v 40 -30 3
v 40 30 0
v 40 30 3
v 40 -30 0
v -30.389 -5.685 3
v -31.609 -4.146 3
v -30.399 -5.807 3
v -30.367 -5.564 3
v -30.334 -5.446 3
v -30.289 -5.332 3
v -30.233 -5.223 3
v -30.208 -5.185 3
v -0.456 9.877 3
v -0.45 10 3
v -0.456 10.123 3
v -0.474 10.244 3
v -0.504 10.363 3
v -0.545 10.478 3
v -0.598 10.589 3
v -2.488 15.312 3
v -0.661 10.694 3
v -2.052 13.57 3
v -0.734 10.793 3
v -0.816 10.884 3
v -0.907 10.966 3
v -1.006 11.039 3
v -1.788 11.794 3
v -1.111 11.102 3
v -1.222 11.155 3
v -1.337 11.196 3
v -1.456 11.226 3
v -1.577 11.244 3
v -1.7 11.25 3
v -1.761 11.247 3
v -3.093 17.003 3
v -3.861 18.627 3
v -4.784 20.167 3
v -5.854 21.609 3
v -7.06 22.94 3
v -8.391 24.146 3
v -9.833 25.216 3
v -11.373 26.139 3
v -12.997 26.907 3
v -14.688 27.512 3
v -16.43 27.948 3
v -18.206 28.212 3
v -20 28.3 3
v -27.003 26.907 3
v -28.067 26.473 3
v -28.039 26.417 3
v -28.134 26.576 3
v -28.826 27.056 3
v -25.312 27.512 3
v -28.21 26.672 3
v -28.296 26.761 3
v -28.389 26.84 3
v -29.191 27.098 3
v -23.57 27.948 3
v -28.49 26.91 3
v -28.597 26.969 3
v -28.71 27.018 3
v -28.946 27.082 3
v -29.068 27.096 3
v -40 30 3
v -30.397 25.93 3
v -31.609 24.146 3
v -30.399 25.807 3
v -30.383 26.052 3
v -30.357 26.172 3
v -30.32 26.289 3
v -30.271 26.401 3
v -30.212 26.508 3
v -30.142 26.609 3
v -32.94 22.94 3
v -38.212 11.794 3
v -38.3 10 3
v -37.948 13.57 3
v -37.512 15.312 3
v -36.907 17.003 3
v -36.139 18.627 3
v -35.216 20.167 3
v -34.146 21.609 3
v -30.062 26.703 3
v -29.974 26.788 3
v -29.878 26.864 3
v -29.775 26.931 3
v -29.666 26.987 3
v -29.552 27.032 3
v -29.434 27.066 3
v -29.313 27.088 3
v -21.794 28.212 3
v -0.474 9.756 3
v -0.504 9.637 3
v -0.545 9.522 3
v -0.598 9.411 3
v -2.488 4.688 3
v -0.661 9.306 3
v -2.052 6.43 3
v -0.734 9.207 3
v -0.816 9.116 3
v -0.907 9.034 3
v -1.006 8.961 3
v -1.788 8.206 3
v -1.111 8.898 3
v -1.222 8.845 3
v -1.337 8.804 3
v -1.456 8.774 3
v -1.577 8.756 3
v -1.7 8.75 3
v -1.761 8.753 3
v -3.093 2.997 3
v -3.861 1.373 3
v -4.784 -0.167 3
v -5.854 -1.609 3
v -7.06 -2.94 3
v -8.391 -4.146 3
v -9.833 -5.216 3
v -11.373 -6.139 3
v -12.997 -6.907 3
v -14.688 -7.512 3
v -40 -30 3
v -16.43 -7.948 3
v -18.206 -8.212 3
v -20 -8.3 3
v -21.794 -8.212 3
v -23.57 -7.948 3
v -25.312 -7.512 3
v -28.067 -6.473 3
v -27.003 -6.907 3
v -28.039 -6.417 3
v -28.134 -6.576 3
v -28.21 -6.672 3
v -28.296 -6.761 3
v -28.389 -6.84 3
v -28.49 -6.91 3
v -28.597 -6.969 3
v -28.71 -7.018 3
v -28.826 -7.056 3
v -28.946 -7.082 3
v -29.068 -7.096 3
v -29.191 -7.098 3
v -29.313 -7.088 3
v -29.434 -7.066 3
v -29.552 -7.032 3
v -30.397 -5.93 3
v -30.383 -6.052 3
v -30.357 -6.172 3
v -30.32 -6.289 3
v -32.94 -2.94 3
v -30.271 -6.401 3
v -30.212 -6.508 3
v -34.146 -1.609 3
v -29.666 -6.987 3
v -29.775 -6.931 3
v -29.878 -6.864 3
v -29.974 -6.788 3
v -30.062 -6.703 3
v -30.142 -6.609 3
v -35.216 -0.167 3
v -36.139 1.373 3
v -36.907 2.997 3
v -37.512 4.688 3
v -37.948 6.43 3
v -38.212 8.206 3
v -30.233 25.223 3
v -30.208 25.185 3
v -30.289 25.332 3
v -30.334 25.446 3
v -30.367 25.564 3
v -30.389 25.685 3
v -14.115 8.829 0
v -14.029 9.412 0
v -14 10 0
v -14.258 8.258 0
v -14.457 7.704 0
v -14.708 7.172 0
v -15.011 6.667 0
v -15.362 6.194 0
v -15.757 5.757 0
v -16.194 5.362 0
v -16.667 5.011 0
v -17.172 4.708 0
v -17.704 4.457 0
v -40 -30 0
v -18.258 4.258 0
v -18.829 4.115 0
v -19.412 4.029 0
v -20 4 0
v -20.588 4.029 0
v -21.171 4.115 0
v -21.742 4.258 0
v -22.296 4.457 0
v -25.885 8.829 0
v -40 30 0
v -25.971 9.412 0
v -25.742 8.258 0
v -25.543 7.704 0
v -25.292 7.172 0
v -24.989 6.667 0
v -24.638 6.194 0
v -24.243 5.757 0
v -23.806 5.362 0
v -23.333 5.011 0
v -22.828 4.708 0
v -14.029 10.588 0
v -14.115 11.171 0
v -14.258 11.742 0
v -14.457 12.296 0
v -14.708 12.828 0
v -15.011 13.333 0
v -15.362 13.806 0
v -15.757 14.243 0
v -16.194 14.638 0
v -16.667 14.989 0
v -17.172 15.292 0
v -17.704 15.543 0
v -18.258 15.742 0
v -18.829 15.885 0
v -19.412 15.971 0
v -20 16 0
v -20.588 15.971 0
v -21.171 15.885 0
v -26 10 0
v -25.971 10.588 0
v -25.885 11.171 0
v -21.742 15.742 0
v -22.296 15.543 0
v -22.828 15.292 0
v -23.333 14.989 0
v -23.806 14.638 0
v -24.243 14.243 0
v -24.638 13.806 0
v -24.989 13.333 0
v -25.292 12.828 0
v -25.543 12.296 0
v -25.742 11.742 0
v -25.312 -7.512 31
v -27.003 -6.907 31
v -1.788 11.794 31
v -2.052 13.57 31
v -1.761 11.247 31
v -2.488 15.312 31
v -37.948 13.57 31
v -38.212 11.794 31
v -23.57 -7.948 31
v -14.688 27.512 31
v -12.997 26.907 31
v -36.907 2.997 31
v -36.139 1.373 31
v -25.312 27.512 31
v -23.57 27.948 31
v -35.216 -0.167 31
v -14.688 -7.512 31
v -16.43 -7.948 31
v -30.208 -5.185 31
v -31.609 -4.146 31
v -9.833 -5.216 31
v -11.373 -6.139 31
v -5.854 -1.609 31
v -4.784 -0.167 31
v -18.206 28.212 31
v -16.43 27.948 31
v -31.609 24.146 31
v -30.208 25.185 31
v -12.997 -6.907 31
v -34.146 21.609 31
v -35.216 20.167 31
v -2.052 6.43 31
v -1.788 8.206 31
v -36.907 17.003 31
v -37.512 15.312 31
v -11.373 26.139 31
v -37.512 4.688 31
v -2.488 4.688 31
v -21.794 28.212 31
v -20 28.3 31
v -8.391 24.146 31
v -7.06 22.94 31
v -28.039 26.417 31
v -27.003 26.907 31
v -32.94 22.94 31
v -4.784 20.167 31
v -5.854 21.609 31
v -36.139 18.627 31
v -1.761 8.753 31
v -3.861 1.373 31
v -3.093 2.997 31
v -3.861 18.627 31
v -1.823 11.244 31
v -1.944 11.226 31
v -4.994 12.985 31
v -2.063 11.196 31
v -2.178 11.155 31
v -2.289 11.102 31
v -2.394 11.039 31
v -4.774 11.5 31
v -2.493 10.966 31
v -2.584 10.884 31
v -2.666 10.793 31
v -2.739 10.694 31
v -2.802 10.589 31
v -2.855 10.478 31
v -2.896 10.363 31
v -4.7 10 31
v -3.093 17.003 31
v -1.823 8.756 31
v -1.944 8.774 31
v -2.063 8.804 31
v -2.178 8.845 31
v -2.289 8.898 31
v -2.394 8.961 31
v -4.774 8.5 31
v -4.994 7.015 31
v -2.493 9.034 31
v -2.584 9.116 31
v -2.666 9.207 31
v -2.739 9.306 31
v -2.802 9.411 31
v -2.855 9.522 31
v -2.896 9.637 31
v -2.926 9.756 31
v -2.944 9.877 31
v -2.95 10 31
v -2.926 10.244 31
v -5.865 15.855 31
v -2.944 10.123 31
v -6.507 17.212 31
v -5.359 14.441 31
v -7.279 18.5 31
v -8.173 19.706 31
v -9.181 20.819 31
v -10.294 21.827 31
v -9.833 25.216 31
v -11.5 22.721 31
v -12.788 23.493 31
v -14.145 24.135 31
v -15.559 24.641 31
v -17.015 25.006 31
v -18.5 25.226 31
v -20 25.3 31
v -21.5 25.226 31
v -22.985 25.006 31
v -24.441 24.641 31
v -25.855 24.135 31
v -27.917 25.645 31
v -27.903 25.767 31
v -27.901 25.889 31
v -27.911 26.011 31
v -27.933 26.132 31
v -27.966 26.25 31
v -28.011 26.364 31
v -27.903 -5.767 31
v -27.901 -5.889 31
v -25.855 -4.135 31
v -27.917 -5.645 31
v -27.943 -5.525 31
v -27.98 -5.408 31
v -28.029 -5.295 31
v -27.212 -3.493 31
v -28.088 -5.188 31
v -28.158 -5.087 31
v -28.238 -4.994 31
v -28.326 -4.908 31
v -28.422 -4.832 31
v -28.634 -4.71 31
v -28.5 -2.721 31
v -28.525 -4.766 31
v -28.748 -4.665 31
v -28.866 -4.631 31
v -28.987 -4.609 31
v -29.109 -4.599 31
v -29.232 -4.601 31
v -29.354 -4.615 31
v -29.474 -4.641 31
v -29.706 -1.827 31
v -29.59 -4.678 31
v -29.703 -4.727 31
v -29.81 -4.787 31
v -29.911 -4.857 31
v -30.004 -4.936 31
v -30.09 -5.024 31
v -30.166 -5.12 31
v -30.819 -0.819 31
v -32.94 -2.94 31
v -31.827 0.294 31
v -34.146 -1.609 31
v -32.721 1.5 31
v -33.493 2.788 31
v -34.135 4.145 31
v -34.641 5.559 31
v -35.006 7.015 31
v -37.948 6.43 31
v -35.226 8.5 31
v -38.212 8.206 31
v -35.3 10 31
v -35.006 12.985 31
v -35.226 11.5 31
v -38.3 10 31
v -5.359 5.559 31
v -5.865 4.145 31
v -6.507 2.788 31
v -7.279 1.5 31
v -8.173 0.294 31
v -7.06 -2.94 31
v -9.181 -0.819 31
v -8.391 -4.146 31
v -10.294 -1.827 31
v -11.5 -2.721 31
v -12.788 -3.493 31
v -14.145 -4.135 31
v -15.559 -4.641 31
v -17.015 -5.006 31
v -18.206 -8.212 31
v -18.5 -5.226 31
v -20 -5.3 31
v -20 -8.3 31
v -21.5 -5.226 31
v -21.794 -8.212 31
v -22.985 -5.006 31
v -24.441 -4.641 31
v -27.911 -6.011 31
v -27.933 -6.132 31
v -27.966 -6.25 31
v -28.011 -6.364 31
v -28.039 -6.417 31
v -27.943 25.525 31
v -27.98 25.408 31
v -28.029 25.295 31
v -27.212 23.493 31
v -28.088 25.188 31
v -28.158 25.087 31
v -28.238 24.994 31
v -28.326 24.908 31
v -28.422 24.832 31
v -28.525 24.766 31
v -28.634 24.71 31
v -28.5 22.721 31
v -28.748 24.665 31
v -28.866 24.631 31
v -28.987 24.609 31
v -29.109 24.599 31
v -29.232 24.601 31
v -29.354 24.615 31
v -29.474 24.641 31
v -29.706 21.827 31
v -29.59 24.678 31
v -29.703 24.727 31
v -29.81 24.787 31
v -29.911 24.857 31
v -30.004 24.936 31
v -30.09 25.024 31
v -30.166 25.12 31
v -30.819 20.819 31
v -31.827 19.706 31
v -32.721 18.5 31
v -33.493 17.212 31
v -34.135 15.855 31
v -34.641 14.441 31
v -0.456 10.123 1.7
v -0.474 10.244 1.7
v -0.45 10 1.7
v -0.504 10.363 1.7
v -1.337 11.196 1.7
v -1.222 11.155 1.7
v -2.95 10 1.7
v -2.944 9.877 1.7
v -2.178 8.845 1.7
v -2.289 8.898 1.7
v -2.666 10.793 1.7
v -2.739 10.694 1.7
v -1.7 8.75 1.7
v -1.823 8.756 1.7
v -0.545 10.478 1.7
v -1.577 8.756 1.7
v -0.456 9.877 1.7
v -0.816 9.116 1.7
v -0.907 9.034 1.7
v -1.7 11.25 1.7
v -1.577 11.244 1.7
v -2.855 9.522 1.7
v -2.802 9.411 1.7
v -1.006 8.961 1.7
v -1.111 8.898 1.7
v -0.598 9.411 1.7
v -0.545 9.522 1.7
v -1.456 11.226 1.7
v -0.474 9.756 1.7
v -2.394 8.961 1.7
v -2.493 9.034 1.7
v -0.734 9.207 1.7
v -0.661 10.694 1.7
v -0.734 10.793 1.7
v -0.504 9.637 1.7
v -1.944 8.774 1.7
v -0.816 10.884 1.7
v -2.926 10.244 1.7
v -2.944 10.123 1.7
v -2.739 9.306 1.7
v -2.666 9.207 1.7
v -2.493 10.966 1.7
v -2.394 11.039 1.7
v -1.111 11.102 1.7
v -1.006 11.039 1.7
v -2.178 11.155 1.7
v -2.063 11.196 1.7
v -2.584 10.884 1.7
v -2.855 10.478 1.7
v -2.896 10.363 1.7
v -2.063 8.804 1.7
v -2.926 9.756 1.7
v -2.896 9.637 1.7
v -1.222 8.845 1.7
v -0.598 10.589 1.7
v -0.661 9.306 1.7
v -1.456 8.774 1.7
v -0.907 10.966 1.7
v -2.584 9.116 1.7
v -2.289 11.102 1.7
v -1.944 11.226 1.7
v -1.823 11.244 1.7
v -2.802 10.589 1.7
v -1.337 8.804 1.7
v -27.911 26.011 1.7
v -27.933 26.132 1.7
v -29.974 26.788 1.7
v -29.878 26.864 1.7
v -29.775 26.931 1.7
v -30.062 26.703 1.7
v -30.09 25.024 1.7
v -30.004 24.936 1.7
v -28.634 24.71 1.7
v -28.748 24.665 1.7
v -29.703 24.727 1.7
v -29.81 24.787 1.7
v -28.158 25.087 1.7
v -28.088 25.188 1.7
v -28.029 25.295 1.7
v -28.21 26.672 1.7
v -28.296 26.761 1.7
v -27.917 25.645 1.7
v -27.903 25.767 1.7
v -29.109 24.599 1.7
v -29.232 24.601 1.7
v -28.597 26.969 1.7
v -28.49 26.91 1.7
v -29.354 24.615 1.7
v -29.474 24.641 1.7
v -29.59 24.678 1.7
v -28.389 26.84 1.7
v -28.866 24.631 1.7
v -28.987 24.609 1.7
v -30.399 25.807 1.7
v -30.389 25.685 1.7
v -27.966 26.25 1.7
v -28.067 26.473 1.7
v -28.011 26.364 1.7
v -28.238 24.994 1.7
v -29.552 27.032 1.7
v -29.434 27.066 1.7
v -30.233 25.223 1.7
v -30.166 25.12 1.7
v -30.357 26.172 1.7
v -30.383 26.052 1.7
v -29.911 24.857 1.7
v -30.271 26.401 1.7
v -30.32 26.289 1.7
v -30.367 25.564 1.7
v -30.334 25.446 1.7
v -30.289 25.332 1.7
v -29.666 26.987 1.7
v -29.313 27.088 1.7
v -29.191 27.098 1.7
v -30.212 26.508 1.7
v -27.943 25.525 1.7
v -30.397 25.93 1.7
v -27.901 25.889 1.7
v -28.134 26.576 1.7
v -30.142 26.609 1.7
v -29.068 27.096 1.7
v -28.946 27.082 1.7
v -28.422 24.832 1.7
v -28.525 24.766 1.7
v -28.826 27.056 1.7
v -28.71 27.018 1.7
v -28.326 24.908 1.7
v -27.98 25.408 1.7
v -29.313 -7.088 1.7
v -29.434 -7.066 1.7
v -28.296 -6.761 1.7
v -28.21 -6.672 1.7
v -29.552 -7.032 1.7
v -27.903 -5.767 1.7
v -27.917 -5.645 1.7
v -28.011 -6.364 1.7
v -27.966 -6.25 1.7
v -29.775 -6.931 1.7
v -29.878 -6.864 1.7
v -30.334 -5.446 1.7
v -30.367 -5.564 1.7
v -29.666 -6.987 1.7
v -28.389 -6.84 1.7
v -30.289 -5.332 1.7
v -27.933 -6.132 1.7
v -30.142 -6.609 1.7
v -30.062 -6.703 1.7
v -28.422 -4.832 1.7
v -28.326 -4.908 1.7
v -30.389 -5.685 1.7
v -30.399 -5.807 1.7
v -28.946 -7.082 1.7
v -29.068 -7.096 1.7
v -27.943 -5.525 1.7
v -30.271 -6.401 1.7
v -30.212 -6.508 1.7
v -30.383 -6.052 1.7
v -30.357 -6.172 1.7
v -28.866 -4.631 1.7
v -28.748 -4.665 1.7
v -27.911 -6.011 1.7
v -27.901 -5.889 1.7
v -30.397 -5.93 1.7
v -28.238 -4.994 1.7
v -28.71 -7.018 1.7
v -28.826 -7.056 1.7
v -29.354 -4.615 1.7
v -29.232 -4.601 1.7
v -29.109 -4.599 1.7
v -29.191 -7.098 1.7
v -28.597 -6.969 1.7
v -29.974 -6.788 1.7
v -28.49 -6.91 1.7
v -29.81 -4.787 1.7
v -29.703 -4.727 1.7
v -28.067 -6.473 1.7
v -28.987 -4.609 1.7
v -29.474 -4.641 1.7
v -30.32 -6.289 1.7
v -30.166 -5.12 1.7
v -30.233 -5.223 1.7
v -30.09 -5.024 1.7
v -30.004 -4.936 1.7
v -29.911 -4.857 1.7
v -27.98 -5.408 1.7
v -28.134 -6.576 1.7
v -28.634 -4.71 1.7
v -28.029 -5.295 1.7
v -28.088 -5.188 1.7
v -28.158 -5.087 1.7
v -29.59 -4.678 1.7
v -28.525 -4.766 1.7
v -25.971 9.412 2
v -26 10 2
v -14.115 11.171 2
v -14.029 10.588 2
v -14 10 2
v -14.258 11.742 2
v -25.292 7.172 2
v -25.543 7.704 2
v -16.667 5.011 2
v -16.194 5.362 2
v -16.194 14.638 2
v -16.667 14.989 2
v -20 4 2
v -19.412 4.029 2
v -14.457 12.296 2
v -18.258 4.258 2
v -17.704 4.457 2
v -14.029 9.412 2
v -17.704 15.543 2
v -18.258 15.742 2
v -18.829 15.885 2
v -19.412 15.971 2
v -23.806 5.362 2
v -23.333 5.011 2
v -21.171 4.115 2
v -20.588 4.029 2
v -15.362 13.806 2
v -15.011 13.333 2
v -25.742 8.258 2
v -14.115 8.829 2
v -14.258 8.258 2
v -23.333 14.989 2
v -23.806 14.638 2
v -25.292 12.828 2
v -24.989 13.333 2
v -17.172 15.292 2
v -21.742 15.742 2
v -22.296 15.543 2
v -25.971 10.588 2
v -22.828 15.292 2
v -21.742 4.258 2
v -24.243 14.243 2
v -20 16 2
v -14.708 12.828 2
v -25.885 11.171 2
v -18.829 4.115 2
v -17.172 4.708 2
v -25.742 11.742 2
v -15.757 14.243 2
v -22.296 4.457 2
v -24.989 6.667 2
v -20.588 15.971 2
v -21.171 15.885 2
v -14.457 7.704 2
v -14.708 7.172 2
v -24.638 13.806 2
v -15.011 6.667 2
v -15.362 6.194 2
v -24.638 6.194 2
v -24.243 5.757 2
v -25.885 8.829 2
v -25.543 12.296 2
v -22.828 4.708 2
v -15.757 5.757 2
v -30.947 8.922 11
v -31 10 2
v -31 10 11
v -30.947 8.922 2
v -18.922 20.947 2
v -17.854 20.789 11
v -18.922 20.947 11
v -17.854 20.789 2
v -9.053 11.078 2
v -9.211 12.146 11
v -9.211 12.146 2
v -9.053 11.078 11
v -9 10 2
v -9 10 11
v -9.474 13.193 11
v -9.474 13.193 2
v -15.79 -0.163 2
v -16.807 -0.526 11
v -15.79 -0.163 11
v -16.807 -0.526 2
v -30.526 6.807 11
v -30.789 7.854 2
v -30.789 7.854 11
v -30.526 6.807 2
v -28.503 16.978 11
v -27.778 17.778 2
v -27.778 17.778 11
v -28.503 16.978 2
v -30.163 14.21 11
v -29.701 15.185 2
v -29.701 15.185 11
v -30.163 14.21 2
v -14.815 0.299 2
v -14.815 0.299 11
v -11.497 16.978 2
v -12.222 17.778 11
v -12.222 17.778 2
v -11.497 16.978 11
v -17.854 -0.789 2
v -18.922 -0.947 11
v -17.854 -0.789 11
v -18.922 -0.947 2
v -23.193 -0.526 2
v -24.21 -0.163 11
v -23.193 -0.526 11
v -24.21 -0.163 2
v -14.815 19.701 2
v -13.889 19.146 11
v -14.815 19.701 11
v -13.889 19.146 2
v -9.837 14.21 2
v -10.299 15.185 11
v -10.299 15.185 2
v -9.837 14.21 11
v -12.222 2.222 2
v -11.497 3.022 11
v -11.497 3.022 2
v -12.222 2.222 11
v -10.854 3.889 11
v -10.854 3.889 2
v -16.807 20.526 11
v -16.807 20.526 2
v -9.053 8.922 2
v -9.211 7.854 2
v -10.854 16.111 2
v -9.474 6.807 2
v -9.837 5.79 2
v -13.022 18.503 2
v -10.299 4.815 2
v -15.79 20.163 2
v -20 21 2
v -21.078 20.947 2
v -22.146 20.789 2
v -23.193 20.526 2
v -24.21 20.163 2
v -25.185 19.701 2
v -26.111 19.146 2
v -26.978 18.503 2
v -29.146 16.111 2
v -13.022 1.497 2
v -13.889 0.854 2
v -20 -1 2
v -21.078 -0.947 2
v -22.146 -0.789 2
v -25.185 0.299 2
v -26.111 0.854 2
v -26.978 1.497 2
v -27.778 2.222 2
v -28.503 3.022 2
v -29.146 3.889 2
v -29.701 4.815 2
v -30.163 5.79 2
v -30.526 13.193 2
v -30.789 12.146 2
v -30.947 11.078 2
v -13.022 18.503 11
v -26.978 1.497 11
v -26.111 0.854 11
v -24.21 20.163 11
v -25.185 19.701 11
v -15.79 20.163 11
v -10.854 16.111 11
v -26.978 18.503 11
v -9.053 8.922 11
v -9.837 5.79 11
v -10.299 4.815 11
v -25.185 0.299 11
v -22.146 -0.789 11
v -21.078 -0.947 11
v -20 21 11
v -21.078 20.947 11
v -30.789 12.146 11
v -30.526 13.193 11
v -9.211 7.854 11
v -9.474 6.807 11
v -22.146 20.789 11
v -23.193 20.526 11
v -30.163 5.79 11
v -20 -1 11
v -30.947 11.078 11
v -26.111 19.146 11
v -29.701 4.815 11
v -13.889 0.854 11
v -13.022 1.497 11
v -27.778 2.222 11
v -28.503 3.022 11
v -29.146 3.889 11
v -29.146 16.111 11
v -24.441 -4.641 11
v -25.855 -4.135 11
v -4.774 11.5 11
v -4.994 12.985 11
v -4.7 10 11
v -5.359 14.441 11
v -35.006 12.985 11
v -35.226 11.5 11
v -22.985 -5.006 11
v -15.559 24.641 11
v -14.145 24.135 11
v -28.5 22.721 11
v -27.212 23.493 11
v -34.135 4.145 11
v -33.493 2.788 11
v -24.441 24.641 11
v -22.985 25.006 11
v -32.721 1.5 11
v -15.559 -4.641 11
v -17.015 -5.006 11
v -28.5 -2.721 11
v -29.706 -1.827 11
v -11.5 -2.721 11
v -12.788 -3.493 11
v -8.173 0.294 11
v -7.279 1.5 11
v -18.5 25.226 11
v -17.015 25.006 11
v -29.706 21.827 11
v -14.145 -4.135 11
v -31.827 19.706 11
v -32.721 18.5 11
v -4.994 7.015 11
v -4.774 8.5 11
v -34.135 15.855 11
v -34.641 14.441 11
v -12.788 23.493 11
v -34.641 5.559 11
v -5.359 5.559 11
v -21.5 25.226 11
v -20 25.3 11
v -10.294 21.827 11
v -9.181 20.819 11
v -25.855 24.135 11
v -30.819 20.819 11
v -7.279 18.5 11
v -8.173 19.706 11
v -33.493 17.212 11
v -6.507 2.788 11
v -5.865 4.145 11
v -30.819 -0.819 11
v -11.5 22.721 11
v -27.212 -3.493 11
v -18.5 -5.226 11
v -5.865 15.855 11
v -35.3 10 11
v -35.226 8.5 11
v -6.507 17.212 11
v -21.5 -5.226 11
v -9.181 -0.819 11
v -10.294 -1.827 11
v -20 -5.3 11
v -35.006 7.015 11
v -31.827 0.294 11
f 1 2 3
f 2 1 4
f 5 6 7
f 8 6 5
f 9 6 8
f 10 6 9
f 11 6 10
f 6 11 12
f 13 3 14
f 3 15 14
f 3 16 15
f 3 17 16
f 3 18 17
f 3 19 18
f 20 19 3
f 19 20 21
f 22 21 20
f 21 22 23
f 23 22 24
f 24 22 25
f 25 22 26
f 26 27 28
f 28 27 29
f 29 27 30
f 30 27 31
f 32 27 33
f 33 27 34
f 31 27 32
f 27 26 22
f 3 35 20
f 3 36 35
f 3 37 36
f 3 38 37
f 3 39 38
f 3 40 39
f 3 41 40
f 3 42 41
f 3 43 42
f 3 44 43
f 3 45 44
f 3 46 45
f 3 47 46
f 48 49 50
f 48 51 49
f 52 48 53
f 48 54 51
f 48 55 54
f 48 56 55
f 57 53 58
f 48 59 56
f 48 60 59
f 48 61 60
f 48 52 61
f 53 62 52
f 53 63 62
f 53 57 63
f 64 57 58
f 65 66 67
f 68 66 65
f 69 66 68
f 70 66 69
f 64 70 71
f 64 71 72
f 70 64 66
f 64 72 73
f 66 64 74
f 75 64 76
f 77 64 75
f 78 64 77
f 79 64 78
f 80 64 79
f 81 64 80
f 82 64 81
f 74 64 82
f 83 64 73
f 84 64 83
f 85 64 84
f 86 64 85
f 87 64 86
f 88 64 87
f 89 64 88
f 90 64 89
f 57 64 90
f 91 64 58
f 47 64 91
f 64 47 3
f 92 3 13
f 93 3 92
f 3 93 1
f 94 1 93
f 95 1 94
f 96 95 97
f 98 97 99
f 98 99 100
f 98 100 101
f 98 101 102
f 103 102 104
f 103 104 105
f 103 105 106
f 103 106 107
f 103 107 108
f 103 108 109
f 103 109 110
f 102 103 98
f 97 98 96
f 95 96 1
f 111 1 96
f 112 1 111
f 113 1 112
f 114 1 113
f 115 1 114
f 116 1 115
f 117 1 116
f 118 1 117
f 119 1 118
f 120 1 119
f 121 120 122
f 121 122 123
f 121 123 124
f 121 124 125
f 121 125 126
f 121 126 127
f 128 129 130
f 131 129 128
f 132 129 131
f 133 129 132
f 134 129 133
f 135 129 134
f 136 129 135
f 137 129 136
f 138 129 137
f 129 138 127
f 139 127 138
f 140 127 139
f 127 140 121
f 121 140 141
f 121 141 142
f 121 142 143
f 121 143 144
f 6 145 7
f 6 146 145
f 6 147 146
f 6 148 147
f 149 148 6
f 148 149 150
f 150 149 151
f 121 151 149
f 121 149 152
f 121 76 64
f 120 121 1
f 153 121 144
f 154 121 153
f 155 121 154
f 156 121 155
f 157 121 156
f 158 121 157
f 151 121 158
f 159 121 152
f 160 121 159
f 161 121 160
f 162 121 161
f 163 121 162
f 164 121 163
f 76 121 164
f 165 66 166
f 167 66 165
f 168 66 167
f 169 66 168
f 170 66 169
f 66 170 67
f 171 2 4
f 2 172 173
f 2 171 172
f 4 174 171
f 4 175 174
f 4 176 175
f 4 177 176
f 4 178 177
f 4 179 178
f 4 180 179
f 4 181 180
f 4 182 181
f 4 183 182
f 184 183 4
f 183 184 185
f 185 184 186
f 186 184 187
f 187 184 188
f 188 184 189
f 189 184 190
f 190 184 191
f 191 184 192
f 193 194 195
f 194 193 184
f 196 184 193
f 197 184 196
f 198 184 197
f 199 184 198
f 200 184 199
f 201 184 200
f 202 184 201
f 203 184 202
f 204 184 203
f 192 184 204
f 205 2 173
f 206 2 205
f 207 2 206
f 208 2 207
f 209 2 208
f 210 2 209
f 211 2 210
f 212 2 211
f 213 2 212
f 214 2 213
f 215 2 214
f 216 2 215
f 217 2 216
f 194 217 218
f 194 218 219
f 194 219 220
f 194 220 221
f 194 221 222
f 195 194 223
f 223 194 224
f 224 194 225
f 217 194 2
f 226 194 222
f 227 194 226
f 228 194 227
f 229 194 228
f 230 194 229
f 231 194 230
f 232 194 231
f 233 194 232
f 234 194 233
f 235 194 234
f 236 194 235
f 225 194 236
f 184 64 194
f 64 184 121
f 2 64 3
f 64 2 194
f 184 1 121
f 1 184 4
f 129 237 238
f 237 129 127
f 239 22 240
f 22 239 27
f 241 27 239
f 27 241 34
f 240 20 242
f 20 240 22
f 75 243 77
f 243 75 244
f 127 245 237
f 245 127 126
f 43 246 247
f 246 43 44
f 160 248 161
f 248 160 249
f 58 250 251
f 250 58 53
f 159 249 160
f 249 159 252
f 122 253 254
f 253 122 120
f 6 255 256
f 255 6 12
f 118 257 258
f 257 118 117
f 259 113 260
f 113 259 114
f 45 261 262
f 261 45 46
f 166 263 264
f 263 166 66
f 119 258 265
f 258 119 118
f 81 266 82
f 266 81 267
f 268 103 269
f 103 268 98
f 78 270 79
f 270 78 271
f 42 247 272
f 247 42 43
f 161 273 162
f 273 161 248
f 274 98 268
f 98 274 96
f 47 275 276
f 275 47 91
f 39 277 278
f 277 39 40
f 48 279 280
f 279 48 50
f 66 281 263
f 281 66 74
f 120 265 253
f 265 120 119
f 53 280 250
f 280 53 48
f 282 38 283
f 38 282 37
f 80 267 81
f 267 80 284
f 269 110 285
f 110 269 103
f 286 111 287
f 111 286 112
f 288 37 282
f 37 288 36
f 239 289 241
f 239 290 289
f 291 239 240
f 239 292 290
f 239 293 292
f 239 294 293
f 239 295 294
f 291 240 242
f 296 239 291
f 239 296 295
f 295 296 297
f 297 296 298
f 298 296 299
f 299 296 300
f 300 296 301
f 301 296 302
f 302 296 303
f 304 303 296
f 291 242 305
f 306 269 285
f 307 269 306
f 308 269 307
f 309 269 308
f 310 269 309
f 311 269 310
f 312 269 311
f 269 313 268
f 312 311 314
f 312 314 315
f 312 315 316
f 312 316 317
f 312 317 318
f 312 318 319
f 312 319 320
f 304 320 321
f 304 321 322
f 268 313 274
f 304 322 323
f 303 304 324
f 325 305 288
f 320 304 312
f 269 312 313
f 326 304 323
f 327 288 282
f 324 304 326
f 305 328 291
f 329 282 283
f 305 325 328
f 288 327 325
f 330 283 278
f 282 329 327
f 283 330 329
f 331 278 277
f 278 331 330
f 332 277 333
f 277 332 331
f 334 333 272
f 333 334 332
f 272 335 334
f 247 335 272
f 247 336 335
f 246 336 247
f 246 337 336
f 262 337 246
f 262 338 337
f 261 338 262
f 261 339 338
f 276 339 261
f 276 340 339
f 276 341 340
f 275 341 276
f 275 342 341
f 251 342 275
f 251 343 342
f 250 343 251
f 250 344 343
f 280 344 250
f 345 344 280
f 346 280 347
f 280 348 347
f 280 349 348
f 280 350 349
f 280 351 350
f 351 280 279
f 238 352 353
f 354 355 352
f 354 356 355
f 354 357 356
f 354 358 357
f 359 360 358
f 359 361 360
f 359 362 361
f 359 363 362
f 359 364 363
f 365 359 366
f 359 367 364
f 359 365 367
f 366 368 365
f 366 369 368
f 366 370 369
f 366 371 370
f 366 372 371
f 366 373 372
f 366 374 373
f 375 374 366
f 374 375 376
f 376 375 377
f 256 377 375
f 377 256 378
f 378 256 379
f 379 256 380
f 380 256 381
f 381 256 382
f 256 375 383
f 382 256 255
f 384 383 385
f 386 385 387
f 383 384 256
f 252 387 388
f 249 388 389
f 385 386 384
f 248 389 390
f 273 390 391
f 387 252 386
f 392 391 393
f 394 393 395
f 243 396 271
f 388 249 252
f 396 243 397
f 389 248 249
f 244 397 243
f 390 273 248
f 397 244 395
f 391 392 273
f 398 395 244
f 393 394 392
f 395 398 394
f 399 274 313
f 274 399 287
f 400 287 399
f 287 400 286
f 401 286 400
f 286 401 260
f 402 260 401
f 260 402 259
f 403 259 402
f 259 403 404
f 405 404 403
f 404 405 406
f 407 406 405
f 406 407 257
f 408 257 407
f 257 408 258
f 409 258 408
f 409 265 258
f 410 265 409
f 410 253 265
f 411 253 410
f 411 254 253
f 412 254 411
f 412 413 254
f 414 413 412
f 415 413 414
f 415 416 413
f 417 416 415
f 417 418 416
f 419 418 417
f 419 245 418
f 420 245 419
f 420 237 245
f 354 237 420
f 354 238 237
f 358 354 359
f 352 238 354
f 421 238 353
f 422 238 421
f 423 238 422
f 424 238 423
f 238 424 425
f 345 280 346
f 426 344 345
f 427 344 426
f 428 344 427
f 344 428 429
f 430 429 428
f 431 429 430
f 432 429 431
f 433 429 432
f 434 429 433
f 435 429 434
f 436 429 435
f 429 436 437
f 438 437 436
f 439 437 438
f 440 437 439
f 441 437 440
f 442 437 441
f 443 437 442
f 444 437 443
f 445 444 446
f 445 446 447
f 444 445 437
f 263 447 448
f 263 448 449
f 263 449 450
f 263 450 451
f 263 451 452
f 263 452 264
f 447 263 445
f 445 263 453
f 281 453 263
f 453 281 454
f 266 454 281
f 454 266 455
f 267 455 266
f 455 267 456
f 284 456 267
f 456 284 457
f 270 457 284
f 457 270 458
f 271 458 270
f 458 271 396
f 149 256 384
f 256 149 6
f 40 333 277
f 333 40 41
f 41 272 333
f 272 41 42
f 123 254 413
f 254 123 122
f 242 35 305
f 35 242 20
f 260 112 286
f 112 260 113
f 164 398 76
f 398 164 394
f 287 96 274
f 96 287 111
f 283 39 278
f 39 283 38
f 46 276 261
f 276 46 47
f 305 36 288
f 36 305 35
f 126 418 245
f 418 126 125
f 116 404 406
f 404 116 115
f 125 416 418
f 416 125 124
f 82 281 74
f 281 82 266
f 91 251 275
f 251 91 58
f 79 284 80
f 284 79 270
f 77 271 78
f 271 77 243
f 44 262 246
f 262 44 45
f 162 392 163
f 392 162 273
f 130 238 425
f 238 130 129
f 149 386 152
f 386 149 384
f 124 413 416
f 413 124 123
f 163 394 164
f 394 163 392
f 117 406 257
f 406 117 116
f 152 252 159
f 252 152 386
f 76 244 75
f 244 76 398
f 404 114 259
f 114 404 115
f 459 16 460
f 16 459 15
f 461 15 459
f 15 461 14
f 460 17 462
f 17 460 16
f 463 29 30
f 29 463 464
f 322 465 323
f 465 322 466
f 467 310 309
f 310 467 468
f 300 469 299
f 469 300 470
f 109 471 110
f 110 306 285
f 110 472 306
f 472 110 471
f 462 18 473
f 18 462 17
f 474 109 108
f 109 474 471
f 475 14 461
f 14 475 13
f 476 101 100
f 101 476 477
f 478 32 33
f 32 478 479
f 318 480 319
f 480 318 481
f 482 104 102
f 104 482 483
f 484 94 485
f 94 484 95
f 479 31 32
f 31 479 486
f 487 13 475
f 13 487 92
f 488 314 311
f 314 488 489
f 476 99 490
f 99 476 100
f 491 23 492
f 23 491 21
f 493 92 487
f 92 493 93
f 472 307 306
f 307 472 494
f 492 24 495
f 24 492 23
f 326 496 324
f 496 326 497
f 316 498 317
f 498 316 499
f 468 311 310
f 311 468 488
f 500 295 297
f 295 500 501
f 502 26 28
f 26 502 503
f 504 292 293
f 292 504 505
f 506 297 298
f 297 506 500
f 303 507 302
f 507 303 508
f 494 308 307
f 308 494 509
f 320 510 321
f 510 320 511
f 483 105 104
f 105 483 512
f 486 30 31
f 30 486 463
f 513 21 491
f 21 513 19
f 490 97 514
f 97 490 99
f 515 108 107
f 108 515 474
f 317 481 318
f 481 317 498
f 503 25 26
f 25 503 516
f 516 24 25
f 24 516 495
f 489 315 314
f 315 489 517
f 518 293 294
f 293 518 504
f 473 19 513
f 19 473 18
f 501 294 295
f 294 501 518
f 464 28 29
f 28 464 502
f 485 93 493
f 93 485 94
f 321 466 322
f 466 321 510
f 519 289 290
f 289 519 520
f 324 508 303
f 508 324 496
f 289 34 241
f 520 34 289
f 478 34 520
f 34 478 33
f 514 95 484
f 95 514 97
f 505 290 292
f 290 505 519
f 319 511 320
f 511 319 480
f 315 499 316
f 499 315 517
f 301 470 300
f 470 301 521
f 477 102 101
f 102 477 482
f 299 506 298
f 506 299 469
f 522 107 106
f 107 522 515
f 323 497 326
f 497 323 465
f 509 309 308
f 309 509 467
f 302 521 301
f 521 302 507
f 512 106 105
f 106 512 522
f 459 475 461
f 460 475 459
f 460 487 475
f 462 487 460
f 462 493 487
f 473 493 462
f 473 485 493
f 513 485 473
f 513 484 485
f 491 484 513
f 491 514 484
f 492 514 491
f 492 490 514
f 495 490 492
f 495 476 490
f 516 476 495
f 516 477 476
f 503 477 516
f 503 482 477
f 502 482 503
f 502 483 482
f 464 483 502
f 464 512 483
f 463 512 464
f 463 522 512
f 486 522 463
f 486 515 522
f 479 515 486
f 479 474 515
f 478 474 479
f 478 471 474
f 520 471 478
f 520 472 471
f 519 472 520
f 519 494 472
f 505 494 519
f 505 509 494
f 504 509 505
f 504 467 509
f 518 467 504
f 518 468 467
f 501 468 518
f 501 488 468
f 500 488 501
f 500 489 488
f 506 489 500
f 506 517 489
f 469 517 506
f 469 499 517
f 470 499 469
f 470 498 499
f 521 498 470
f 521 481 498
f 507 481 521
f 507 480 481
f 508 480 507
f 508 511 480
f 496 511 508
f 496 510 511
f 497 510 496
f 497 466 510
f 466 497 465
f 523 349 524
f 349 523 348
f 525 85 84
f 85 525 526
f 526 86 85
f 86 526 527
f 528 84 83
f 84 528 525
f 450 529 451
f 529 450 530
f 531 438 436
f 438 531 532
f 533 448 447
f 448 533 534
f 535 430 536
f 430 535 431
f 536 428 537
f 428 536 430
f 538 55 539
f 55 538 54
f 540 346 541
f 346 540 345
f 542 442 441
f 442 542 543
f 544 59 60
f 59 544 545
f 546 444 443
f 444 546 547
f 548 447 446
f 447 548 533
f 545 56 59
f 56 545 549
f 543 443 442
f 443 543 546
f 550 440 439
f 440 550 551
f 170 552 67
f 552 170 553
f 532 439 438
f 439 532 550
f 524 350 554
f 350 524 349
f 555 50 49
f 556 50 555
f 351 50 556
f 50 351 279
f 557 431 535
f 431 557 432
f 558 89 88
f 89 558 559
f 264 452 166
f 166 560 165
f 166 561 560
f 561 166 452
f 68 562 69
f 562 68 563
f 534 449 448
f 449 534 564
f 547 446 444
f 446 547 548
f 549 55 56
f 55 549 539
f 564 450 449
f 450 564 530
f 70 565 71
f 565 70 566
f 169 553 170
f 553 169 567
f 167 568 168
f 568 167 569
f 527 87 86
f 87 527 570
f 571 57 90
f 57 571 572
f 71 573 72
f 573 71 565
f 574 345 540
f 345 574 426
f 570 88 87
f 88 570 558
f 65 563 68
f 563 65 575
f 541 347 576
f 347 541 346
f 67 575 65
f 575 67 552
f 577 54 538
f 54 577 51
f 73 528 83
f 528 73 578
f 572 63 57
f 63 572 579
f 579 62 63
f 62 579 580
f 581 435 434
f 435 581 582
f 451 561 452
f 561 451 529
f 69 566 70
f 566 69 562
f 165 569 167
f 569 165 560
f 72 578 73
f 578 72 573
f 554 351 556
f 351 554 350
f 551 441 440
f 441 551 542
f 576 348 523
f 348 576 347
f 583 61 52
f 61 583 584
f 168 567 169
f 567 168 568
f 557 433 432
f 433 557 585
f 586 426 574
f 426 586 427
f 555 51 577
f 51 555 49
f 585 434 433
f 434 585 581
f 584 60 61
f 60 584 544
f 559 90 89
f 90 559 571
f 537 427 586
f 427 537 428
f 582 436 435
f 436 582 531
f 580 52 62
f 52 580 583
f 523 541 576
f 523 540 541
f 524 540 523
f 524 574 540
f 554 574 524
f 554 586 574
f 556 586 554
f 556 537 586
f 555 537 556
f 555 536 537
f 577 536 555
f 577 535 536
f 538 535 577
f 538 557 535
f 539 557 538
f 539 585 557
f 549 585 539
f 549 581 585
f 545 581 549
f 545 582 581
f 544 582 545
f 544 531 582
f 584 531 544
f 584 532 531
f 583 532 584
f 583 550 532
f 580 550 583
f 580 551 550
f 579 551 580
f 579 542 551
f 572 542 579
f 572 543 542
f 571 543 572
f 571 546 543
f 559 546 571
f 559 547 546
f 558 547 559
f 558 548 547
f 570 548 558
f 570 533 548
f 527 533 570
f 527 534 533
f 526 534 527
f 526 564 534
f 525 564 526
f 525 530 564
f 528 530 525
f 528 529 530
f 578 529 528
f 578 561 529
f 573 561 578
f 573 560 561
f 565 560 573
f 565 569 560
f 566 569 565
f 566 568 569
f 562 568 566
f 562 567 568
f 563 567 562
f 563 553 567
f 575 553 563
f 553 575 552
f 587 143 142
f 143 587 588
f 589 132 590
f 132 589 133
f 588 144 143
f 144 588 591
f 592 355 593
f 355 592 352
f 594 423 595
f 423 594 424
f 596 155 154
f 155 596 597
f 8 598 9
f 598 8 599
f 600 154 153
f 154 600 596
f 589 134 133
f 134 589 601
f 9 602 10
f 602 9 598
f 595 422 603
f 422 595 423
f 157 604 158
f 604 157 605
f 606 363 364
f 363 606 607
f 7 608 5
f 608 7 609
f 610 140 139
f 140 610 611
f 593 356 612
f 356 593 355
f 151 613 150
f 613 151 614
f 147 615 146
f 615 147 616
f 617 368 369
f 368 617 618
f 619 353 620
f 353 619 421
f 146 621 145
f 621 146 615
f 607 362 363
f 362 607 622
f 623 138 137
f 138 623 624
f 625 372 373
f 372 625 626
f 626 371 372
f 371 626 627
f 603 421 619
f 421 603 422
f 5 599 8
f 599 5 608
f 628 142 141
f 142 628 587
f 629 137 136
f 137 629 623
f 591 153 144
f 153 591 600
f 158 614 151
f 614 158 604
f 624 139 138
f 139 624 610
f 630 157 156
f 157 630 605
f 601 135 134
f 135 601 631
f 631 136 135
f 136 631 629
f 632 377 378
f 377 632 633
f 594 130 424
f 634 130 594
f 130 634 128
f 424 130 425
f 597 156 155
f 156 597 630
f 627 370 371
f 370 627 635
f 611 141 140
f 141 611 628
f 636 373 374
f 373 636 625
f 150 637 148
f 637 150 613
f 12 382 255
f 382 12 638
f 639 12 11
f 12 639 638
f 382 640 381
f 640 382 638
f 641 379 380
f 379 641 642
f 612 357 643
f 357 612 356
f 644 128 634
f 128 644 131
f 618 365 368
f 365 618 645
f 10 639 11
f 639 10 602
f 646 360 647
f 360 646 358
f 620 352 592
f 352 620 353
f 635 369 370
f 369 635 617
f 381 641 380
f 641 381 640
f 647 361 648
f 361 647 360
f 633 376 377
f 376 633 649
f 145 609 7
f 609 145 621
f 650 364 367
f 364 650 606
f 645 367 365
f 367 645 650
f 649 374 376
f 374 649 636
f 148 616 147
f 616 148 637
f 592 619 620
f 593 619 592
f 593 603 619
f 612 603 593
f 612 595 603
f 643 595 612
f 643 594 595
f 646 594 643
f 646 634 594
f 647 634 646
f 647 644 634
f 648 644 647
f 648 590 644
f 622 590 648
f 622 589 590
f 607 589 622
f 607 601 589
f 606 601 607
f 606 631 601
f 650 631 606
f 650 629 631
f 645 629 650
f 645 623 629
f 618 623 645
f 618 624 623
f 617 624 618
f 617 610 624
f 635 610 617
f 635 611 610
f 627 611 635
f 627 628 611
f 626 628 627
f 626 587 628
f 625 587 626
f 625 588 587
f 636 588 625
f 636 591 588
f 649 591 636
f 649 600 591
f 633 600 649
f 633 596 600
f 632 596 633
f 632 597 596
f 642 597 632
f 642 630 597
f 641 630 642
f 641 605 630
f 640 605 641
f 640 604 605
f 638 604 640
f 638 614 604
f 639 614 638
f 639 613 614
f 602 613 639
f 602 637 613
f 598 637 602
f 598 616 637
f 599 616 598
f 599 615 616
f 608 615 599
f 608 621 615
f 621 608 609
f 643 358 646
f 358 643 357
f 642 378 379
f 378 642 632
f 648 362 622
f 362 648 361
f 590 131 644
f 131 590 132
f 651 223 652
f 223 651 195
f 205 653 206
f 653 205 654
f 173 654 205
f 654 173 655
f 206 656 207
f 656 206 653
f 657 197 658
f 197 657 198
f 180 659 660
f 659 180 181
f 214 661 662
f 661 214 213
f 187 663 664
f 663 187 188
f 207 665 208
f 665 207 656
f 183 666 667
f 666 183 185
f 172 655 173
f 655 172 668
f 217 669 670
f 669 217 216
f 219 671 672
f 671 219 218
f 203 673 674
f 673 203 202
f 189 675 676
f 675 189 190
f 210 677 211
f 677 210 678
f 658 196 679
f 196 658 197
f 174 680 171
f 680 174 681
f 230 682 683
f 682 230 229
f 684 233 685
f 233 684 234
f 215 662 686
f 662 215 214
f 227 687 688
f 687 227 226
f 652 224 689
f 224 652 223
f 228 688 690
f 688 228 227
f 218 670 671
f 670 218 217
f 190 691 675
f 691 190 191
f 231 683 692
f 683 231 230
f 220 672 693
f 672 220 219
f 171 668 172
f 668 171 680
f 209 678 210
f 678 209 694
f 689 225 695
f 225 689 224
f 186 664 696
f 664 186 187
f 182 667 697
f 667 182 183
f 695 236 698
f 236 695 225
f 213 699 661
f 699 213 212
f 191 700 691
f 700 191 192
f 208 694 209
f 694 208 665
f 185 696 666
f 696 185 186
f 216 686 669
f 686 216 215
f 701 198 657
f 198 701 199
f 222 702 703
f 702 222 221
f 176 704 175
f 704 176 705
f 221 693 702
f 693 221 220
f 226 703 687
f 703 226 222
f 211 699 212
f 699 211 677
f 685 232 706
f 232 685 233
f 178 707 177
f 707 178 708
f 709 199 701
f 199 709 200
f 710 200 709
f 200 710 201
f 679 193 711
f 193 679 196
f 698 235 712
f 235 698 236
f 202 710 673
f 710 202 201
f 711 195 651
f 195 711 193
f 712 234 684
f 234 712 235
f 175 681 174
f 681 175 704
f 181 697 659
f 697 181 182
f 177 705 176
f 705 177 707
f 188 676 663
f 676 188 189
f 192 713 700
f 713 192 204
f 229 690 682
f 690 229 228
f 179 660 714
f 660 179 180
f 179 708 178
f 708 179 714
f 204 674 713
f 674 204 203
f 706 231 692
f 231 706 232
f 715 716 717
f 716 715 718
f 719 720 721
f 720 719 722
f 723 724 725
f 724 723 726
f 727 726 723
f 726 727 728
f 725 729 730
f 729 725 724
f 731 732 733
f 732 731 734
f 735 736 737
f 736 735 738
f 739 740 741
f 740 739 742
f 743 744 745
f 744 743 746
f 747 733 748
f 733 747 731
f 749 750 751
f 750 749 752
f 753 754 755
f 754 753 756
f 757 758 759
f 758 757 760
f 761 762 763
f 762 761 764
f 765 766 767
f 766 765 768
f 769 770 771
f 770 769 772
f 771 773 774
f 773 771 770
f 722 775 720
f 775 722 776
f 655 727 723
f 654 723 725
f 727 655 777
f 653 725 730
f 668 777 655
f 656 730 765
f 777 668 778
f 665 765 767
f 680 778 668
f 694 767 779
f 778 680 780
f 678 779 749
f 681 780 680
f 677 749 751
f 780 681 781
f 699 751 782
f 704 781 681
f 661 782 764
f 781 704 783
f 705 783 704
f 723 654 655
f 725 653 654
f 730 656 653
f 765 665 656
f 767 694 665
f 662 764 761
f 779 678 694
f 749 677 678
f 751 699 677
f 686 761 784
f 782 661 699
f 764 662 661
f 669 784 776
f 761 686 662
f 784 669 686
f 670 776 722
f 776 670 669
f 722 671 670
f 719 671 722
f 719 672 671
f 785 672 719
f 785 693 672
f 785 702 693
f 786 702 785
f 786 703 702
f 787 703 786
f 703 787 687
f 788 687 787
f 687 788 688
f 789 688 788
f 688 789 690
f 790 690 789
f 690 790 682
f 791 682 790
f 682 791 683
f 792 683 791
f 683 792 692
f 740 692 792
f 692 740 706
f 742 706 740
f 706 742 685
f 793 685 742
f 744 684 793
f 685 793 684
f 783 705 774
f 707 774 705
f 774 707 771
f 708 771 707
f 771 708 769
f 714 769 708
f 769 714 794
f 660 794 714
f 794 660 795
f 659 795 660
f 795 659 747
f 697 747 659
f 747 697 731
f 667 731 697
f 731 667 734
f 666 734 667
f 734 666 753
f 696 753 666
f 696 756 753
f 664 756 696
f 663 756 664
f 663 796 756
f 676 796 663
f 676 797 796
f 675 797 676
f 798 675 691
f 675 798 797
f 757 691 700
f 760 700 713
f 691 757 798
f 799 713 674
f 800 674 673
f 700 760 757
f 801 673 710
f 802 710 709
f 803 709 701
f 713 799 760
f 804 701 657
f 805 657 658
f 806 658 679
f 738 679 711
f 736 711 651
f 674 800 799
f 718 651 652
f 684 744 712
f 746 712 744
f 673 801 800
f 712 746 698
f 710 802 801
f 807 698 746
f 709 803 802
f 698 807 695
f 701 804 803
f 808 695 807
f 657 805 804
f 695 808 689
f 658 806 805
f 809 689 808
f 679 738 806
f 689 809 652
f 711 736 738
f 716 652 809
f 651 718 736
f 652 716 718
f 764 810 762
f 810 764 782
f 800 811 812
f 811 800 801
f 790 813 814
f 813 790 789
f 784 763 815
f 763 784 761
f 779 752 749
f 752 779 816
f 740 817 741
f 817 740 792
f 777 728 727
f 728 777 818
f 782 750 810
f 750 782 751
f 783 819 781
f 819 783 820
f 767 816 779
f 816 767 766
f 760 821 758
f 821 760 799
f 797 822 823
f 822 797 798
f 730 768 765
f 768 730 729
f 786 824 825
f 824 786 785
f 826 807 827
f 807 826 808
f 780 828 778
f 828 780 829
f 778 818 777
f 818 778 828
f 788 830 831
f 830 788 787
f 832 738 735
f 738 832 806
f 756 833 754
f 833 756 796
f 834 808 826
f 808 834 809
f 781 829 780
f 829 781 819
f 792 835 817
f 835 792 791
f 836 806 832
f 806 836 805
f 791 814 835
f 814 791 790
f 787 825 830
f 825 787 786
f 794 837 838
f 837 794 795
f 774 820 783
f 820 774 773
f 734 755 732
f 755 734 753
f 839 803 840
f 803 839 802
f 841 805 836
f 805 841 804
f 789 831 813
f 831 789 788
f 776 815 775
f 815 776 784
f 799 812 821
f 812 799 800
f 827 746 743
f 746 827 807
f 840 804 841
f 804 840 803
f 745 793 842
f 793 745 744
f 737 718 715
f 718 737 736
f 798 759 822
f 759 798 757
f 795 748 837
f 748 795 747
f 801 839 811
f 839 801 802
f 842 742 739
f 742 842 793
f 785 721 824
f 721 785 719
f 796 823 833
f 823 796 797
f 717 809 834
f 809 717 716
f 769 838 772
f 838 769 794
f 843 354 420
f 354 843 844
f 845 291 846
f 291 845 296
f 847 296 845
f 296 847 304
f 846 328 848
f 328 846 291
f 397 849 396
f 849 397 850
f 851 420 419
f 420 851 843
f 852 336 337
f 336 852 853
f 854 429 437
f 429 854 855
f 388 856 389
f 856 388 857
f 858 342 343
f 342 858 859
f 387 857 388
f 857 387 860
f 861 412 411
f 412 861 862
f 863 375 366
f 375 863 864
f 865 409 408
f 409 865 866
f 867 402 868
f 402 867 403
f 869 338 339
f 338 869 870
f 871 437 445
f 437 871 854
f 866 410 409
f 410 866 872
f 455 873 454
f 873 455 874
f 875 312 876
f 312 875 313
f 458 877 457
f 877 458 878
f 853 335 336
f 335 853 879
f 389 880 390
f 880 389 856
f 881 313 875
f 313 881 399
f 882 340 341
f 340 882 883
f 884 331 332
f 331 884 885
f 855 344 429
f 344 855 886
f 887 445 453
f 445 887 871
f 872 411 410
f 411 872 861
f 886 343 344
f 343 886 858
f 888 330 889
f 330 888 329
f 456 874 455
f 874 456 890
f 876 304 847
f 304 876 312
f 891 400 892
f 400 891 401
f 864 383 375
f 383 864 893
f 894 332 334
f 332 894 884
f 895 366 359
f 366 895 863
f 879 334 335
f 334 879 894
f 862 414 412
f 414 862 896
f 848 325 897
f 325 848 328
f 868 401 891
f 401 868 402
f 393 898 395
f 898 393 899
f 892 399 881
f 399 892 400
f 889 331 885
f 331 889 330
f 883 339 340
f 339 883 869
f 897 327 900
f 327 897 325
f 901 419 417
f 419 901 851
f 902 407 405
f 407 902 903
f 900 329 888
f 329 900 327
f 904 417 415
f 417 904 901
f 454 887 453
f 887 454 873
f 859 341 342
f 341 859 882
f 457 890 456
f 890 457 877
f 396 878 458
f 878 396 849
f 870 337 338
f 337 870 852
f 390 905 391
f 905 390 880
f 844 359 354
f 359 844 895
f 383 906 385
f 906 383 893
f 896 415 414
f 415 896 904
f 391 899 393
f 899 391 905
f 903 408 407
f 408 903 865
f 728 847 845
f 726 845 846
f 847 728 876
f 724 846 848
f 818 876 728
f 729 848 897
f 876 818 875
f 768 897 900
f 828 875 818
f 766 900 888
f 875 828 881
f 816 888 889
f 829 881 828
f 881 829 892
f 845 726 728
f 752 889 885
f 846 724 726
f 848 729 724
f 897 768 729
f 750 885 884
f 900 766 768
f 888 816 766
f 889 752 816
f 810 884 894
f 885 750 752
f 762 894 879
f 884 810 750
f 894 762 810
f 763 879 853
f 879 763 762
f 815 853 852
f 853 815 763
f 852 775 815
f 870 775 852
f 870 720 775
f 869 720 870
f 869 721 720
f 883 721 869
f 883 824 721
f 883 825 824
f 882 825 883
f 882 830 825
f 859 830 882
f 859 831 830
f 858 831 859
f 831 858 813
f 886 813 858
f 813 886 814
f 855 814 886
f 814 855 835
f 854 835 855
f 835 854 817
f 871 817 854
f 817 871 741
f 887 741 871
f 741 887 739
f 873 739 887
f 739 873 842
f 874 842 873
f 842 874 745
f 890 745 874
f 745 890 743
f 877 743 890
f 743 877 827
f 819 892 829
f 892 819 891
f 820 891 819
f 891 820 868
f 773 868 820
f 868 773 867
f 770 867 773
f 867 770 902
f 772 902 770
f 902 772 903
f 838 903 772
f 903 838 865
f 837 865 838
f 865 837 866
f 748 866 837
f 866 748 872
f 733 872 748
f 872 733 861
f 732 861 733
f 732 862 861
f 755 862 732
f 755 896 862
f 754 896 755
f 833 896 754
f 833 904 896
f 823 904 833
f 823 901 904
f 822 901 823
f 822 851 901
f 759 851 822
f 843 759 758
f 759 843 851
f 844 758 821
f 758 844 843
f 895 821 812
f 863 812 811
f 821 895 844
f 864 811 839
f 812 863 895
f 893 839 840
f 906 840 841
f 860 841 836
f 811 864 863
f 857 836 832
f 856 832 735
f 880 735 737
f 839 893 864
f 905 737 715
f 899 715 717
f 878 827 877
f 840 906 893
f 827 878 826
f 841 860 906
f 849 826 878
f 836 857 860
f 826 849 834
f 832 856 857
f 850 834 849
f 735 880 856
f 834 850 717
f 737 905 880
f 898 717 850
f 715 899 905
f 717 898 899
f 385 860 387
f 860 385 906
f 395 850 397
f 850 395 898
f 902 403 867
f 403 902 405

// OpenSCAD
// Adapter: phone camera over microscope eyepiece (30 mm OD), printed phone-side down
// All dimensions in mm, measured with calipers.

// ---- Plate ----
plate_x = 80;   // plate length in X
plate_y = 60;   // plate width in Y
plate_t = 3;    // plate thickness (z = 0..3)
cam_hole_d = 12;    // camera through-hole diameter
cam_hole_x = -20;   // camera hole centre X
cam_hole_y = 10;    // camera hole centre Y

// ---- Sleeve (on camera-hole axis) ----
sleeve_od = 36.6;   // sleeve outer diameter
sleeve_z0 = 3;      // sleeve base (sits on plate top)
sleeve_z1 = 31;     // sleeve top (open)
bore1_d = 22;       // lower bore (camera stop) diameter
bore1_z0 = 3;       // lower bore start
bore1_z1 = 11;      // lower bore end
bore2_d = 30.6;     // upper bore (slides over 30 mm eyepiece) diameter
bore2_z0 = 11;      // upper bore start
bore2_z1 = 31;      // upper bore end (open top)

// ---- M3 centring screw holes ----
screw_hole_d = 2.5;   // radial hole diameter
screw_z = 21;         // hole axis height
screw_n = 3;          // number of radial holes
screw_start = 0;      // first hole points +X

$fn = 64;

// ===================== BODY =====================
module body() { union() {
    // Flat plate on the bed, centred on origin
    translate([-plate_x/2, -plate_y/2, 0])
        cube([plate_x, plate_y, plate_t]);

    // Round sleeve standing on the plate, on the camera-hole axis
    translate([cam_hole_x, cam_hole_y, 0])
        cylinder(h = sleeve_z1, d = sleeve_od, center = false);
} }

// ===================== CUTS =====================
module cuts() { union() {
    // Camera through-hole in the plate (extends 1 mm past each face)
    translate([cam_hole_x, cam_hole_y, -1])
        cylinder(h = plate_t + 2, d = cam_hole_d, center = false);

    // Lower bore (camera stop) - extends 1 mm below plate and 0.5 mm into upper bore
    translate([cam_hole_x, cam_hole_y, bore1_z0 - 1])
        cylinder(h = (bore1_z1 - bore1_z0) + 1.5, d = bore1_d, center = false);

    // Upper bore (slides over eyepiece) - extends 1 mm past open top
    translate([cam_hole_x, cam_hole_y, bore2_z0])
        cylinder(h = (bore2_z1 - bore2_z0) + 1, d = bore2_d, center = false);

    // Three radial 2.5 mm M3 centring-screw holes, 120 deg apart, first in +X.
    // Offset the cylinder outward by half the sleeve outer diameter ALONG the
    // local +X (radial) direction BEFORE rotating about the sleeve axis, so the
    // hole stays at height screw_z and spans the sleeve wall (bore2 -> outer).
    // It extends 1 mm past the outer wall on each side.
    for (i = [0 : screw_n - 1]) {
        a = screw_start + i * 360 / screw_n;
        translate([cam_hole_x, cam_hole_y, screw_z])
        rotate([0, 0, a])
        translate([sleeve_od / 2, 0, 0])
        cylinder(h = sleeve_od + 2, d = screw_hole_d, center = true);
    }
} }

// ===================== FINAL PART =====================
difference() {
    body();
    cuts();
}
